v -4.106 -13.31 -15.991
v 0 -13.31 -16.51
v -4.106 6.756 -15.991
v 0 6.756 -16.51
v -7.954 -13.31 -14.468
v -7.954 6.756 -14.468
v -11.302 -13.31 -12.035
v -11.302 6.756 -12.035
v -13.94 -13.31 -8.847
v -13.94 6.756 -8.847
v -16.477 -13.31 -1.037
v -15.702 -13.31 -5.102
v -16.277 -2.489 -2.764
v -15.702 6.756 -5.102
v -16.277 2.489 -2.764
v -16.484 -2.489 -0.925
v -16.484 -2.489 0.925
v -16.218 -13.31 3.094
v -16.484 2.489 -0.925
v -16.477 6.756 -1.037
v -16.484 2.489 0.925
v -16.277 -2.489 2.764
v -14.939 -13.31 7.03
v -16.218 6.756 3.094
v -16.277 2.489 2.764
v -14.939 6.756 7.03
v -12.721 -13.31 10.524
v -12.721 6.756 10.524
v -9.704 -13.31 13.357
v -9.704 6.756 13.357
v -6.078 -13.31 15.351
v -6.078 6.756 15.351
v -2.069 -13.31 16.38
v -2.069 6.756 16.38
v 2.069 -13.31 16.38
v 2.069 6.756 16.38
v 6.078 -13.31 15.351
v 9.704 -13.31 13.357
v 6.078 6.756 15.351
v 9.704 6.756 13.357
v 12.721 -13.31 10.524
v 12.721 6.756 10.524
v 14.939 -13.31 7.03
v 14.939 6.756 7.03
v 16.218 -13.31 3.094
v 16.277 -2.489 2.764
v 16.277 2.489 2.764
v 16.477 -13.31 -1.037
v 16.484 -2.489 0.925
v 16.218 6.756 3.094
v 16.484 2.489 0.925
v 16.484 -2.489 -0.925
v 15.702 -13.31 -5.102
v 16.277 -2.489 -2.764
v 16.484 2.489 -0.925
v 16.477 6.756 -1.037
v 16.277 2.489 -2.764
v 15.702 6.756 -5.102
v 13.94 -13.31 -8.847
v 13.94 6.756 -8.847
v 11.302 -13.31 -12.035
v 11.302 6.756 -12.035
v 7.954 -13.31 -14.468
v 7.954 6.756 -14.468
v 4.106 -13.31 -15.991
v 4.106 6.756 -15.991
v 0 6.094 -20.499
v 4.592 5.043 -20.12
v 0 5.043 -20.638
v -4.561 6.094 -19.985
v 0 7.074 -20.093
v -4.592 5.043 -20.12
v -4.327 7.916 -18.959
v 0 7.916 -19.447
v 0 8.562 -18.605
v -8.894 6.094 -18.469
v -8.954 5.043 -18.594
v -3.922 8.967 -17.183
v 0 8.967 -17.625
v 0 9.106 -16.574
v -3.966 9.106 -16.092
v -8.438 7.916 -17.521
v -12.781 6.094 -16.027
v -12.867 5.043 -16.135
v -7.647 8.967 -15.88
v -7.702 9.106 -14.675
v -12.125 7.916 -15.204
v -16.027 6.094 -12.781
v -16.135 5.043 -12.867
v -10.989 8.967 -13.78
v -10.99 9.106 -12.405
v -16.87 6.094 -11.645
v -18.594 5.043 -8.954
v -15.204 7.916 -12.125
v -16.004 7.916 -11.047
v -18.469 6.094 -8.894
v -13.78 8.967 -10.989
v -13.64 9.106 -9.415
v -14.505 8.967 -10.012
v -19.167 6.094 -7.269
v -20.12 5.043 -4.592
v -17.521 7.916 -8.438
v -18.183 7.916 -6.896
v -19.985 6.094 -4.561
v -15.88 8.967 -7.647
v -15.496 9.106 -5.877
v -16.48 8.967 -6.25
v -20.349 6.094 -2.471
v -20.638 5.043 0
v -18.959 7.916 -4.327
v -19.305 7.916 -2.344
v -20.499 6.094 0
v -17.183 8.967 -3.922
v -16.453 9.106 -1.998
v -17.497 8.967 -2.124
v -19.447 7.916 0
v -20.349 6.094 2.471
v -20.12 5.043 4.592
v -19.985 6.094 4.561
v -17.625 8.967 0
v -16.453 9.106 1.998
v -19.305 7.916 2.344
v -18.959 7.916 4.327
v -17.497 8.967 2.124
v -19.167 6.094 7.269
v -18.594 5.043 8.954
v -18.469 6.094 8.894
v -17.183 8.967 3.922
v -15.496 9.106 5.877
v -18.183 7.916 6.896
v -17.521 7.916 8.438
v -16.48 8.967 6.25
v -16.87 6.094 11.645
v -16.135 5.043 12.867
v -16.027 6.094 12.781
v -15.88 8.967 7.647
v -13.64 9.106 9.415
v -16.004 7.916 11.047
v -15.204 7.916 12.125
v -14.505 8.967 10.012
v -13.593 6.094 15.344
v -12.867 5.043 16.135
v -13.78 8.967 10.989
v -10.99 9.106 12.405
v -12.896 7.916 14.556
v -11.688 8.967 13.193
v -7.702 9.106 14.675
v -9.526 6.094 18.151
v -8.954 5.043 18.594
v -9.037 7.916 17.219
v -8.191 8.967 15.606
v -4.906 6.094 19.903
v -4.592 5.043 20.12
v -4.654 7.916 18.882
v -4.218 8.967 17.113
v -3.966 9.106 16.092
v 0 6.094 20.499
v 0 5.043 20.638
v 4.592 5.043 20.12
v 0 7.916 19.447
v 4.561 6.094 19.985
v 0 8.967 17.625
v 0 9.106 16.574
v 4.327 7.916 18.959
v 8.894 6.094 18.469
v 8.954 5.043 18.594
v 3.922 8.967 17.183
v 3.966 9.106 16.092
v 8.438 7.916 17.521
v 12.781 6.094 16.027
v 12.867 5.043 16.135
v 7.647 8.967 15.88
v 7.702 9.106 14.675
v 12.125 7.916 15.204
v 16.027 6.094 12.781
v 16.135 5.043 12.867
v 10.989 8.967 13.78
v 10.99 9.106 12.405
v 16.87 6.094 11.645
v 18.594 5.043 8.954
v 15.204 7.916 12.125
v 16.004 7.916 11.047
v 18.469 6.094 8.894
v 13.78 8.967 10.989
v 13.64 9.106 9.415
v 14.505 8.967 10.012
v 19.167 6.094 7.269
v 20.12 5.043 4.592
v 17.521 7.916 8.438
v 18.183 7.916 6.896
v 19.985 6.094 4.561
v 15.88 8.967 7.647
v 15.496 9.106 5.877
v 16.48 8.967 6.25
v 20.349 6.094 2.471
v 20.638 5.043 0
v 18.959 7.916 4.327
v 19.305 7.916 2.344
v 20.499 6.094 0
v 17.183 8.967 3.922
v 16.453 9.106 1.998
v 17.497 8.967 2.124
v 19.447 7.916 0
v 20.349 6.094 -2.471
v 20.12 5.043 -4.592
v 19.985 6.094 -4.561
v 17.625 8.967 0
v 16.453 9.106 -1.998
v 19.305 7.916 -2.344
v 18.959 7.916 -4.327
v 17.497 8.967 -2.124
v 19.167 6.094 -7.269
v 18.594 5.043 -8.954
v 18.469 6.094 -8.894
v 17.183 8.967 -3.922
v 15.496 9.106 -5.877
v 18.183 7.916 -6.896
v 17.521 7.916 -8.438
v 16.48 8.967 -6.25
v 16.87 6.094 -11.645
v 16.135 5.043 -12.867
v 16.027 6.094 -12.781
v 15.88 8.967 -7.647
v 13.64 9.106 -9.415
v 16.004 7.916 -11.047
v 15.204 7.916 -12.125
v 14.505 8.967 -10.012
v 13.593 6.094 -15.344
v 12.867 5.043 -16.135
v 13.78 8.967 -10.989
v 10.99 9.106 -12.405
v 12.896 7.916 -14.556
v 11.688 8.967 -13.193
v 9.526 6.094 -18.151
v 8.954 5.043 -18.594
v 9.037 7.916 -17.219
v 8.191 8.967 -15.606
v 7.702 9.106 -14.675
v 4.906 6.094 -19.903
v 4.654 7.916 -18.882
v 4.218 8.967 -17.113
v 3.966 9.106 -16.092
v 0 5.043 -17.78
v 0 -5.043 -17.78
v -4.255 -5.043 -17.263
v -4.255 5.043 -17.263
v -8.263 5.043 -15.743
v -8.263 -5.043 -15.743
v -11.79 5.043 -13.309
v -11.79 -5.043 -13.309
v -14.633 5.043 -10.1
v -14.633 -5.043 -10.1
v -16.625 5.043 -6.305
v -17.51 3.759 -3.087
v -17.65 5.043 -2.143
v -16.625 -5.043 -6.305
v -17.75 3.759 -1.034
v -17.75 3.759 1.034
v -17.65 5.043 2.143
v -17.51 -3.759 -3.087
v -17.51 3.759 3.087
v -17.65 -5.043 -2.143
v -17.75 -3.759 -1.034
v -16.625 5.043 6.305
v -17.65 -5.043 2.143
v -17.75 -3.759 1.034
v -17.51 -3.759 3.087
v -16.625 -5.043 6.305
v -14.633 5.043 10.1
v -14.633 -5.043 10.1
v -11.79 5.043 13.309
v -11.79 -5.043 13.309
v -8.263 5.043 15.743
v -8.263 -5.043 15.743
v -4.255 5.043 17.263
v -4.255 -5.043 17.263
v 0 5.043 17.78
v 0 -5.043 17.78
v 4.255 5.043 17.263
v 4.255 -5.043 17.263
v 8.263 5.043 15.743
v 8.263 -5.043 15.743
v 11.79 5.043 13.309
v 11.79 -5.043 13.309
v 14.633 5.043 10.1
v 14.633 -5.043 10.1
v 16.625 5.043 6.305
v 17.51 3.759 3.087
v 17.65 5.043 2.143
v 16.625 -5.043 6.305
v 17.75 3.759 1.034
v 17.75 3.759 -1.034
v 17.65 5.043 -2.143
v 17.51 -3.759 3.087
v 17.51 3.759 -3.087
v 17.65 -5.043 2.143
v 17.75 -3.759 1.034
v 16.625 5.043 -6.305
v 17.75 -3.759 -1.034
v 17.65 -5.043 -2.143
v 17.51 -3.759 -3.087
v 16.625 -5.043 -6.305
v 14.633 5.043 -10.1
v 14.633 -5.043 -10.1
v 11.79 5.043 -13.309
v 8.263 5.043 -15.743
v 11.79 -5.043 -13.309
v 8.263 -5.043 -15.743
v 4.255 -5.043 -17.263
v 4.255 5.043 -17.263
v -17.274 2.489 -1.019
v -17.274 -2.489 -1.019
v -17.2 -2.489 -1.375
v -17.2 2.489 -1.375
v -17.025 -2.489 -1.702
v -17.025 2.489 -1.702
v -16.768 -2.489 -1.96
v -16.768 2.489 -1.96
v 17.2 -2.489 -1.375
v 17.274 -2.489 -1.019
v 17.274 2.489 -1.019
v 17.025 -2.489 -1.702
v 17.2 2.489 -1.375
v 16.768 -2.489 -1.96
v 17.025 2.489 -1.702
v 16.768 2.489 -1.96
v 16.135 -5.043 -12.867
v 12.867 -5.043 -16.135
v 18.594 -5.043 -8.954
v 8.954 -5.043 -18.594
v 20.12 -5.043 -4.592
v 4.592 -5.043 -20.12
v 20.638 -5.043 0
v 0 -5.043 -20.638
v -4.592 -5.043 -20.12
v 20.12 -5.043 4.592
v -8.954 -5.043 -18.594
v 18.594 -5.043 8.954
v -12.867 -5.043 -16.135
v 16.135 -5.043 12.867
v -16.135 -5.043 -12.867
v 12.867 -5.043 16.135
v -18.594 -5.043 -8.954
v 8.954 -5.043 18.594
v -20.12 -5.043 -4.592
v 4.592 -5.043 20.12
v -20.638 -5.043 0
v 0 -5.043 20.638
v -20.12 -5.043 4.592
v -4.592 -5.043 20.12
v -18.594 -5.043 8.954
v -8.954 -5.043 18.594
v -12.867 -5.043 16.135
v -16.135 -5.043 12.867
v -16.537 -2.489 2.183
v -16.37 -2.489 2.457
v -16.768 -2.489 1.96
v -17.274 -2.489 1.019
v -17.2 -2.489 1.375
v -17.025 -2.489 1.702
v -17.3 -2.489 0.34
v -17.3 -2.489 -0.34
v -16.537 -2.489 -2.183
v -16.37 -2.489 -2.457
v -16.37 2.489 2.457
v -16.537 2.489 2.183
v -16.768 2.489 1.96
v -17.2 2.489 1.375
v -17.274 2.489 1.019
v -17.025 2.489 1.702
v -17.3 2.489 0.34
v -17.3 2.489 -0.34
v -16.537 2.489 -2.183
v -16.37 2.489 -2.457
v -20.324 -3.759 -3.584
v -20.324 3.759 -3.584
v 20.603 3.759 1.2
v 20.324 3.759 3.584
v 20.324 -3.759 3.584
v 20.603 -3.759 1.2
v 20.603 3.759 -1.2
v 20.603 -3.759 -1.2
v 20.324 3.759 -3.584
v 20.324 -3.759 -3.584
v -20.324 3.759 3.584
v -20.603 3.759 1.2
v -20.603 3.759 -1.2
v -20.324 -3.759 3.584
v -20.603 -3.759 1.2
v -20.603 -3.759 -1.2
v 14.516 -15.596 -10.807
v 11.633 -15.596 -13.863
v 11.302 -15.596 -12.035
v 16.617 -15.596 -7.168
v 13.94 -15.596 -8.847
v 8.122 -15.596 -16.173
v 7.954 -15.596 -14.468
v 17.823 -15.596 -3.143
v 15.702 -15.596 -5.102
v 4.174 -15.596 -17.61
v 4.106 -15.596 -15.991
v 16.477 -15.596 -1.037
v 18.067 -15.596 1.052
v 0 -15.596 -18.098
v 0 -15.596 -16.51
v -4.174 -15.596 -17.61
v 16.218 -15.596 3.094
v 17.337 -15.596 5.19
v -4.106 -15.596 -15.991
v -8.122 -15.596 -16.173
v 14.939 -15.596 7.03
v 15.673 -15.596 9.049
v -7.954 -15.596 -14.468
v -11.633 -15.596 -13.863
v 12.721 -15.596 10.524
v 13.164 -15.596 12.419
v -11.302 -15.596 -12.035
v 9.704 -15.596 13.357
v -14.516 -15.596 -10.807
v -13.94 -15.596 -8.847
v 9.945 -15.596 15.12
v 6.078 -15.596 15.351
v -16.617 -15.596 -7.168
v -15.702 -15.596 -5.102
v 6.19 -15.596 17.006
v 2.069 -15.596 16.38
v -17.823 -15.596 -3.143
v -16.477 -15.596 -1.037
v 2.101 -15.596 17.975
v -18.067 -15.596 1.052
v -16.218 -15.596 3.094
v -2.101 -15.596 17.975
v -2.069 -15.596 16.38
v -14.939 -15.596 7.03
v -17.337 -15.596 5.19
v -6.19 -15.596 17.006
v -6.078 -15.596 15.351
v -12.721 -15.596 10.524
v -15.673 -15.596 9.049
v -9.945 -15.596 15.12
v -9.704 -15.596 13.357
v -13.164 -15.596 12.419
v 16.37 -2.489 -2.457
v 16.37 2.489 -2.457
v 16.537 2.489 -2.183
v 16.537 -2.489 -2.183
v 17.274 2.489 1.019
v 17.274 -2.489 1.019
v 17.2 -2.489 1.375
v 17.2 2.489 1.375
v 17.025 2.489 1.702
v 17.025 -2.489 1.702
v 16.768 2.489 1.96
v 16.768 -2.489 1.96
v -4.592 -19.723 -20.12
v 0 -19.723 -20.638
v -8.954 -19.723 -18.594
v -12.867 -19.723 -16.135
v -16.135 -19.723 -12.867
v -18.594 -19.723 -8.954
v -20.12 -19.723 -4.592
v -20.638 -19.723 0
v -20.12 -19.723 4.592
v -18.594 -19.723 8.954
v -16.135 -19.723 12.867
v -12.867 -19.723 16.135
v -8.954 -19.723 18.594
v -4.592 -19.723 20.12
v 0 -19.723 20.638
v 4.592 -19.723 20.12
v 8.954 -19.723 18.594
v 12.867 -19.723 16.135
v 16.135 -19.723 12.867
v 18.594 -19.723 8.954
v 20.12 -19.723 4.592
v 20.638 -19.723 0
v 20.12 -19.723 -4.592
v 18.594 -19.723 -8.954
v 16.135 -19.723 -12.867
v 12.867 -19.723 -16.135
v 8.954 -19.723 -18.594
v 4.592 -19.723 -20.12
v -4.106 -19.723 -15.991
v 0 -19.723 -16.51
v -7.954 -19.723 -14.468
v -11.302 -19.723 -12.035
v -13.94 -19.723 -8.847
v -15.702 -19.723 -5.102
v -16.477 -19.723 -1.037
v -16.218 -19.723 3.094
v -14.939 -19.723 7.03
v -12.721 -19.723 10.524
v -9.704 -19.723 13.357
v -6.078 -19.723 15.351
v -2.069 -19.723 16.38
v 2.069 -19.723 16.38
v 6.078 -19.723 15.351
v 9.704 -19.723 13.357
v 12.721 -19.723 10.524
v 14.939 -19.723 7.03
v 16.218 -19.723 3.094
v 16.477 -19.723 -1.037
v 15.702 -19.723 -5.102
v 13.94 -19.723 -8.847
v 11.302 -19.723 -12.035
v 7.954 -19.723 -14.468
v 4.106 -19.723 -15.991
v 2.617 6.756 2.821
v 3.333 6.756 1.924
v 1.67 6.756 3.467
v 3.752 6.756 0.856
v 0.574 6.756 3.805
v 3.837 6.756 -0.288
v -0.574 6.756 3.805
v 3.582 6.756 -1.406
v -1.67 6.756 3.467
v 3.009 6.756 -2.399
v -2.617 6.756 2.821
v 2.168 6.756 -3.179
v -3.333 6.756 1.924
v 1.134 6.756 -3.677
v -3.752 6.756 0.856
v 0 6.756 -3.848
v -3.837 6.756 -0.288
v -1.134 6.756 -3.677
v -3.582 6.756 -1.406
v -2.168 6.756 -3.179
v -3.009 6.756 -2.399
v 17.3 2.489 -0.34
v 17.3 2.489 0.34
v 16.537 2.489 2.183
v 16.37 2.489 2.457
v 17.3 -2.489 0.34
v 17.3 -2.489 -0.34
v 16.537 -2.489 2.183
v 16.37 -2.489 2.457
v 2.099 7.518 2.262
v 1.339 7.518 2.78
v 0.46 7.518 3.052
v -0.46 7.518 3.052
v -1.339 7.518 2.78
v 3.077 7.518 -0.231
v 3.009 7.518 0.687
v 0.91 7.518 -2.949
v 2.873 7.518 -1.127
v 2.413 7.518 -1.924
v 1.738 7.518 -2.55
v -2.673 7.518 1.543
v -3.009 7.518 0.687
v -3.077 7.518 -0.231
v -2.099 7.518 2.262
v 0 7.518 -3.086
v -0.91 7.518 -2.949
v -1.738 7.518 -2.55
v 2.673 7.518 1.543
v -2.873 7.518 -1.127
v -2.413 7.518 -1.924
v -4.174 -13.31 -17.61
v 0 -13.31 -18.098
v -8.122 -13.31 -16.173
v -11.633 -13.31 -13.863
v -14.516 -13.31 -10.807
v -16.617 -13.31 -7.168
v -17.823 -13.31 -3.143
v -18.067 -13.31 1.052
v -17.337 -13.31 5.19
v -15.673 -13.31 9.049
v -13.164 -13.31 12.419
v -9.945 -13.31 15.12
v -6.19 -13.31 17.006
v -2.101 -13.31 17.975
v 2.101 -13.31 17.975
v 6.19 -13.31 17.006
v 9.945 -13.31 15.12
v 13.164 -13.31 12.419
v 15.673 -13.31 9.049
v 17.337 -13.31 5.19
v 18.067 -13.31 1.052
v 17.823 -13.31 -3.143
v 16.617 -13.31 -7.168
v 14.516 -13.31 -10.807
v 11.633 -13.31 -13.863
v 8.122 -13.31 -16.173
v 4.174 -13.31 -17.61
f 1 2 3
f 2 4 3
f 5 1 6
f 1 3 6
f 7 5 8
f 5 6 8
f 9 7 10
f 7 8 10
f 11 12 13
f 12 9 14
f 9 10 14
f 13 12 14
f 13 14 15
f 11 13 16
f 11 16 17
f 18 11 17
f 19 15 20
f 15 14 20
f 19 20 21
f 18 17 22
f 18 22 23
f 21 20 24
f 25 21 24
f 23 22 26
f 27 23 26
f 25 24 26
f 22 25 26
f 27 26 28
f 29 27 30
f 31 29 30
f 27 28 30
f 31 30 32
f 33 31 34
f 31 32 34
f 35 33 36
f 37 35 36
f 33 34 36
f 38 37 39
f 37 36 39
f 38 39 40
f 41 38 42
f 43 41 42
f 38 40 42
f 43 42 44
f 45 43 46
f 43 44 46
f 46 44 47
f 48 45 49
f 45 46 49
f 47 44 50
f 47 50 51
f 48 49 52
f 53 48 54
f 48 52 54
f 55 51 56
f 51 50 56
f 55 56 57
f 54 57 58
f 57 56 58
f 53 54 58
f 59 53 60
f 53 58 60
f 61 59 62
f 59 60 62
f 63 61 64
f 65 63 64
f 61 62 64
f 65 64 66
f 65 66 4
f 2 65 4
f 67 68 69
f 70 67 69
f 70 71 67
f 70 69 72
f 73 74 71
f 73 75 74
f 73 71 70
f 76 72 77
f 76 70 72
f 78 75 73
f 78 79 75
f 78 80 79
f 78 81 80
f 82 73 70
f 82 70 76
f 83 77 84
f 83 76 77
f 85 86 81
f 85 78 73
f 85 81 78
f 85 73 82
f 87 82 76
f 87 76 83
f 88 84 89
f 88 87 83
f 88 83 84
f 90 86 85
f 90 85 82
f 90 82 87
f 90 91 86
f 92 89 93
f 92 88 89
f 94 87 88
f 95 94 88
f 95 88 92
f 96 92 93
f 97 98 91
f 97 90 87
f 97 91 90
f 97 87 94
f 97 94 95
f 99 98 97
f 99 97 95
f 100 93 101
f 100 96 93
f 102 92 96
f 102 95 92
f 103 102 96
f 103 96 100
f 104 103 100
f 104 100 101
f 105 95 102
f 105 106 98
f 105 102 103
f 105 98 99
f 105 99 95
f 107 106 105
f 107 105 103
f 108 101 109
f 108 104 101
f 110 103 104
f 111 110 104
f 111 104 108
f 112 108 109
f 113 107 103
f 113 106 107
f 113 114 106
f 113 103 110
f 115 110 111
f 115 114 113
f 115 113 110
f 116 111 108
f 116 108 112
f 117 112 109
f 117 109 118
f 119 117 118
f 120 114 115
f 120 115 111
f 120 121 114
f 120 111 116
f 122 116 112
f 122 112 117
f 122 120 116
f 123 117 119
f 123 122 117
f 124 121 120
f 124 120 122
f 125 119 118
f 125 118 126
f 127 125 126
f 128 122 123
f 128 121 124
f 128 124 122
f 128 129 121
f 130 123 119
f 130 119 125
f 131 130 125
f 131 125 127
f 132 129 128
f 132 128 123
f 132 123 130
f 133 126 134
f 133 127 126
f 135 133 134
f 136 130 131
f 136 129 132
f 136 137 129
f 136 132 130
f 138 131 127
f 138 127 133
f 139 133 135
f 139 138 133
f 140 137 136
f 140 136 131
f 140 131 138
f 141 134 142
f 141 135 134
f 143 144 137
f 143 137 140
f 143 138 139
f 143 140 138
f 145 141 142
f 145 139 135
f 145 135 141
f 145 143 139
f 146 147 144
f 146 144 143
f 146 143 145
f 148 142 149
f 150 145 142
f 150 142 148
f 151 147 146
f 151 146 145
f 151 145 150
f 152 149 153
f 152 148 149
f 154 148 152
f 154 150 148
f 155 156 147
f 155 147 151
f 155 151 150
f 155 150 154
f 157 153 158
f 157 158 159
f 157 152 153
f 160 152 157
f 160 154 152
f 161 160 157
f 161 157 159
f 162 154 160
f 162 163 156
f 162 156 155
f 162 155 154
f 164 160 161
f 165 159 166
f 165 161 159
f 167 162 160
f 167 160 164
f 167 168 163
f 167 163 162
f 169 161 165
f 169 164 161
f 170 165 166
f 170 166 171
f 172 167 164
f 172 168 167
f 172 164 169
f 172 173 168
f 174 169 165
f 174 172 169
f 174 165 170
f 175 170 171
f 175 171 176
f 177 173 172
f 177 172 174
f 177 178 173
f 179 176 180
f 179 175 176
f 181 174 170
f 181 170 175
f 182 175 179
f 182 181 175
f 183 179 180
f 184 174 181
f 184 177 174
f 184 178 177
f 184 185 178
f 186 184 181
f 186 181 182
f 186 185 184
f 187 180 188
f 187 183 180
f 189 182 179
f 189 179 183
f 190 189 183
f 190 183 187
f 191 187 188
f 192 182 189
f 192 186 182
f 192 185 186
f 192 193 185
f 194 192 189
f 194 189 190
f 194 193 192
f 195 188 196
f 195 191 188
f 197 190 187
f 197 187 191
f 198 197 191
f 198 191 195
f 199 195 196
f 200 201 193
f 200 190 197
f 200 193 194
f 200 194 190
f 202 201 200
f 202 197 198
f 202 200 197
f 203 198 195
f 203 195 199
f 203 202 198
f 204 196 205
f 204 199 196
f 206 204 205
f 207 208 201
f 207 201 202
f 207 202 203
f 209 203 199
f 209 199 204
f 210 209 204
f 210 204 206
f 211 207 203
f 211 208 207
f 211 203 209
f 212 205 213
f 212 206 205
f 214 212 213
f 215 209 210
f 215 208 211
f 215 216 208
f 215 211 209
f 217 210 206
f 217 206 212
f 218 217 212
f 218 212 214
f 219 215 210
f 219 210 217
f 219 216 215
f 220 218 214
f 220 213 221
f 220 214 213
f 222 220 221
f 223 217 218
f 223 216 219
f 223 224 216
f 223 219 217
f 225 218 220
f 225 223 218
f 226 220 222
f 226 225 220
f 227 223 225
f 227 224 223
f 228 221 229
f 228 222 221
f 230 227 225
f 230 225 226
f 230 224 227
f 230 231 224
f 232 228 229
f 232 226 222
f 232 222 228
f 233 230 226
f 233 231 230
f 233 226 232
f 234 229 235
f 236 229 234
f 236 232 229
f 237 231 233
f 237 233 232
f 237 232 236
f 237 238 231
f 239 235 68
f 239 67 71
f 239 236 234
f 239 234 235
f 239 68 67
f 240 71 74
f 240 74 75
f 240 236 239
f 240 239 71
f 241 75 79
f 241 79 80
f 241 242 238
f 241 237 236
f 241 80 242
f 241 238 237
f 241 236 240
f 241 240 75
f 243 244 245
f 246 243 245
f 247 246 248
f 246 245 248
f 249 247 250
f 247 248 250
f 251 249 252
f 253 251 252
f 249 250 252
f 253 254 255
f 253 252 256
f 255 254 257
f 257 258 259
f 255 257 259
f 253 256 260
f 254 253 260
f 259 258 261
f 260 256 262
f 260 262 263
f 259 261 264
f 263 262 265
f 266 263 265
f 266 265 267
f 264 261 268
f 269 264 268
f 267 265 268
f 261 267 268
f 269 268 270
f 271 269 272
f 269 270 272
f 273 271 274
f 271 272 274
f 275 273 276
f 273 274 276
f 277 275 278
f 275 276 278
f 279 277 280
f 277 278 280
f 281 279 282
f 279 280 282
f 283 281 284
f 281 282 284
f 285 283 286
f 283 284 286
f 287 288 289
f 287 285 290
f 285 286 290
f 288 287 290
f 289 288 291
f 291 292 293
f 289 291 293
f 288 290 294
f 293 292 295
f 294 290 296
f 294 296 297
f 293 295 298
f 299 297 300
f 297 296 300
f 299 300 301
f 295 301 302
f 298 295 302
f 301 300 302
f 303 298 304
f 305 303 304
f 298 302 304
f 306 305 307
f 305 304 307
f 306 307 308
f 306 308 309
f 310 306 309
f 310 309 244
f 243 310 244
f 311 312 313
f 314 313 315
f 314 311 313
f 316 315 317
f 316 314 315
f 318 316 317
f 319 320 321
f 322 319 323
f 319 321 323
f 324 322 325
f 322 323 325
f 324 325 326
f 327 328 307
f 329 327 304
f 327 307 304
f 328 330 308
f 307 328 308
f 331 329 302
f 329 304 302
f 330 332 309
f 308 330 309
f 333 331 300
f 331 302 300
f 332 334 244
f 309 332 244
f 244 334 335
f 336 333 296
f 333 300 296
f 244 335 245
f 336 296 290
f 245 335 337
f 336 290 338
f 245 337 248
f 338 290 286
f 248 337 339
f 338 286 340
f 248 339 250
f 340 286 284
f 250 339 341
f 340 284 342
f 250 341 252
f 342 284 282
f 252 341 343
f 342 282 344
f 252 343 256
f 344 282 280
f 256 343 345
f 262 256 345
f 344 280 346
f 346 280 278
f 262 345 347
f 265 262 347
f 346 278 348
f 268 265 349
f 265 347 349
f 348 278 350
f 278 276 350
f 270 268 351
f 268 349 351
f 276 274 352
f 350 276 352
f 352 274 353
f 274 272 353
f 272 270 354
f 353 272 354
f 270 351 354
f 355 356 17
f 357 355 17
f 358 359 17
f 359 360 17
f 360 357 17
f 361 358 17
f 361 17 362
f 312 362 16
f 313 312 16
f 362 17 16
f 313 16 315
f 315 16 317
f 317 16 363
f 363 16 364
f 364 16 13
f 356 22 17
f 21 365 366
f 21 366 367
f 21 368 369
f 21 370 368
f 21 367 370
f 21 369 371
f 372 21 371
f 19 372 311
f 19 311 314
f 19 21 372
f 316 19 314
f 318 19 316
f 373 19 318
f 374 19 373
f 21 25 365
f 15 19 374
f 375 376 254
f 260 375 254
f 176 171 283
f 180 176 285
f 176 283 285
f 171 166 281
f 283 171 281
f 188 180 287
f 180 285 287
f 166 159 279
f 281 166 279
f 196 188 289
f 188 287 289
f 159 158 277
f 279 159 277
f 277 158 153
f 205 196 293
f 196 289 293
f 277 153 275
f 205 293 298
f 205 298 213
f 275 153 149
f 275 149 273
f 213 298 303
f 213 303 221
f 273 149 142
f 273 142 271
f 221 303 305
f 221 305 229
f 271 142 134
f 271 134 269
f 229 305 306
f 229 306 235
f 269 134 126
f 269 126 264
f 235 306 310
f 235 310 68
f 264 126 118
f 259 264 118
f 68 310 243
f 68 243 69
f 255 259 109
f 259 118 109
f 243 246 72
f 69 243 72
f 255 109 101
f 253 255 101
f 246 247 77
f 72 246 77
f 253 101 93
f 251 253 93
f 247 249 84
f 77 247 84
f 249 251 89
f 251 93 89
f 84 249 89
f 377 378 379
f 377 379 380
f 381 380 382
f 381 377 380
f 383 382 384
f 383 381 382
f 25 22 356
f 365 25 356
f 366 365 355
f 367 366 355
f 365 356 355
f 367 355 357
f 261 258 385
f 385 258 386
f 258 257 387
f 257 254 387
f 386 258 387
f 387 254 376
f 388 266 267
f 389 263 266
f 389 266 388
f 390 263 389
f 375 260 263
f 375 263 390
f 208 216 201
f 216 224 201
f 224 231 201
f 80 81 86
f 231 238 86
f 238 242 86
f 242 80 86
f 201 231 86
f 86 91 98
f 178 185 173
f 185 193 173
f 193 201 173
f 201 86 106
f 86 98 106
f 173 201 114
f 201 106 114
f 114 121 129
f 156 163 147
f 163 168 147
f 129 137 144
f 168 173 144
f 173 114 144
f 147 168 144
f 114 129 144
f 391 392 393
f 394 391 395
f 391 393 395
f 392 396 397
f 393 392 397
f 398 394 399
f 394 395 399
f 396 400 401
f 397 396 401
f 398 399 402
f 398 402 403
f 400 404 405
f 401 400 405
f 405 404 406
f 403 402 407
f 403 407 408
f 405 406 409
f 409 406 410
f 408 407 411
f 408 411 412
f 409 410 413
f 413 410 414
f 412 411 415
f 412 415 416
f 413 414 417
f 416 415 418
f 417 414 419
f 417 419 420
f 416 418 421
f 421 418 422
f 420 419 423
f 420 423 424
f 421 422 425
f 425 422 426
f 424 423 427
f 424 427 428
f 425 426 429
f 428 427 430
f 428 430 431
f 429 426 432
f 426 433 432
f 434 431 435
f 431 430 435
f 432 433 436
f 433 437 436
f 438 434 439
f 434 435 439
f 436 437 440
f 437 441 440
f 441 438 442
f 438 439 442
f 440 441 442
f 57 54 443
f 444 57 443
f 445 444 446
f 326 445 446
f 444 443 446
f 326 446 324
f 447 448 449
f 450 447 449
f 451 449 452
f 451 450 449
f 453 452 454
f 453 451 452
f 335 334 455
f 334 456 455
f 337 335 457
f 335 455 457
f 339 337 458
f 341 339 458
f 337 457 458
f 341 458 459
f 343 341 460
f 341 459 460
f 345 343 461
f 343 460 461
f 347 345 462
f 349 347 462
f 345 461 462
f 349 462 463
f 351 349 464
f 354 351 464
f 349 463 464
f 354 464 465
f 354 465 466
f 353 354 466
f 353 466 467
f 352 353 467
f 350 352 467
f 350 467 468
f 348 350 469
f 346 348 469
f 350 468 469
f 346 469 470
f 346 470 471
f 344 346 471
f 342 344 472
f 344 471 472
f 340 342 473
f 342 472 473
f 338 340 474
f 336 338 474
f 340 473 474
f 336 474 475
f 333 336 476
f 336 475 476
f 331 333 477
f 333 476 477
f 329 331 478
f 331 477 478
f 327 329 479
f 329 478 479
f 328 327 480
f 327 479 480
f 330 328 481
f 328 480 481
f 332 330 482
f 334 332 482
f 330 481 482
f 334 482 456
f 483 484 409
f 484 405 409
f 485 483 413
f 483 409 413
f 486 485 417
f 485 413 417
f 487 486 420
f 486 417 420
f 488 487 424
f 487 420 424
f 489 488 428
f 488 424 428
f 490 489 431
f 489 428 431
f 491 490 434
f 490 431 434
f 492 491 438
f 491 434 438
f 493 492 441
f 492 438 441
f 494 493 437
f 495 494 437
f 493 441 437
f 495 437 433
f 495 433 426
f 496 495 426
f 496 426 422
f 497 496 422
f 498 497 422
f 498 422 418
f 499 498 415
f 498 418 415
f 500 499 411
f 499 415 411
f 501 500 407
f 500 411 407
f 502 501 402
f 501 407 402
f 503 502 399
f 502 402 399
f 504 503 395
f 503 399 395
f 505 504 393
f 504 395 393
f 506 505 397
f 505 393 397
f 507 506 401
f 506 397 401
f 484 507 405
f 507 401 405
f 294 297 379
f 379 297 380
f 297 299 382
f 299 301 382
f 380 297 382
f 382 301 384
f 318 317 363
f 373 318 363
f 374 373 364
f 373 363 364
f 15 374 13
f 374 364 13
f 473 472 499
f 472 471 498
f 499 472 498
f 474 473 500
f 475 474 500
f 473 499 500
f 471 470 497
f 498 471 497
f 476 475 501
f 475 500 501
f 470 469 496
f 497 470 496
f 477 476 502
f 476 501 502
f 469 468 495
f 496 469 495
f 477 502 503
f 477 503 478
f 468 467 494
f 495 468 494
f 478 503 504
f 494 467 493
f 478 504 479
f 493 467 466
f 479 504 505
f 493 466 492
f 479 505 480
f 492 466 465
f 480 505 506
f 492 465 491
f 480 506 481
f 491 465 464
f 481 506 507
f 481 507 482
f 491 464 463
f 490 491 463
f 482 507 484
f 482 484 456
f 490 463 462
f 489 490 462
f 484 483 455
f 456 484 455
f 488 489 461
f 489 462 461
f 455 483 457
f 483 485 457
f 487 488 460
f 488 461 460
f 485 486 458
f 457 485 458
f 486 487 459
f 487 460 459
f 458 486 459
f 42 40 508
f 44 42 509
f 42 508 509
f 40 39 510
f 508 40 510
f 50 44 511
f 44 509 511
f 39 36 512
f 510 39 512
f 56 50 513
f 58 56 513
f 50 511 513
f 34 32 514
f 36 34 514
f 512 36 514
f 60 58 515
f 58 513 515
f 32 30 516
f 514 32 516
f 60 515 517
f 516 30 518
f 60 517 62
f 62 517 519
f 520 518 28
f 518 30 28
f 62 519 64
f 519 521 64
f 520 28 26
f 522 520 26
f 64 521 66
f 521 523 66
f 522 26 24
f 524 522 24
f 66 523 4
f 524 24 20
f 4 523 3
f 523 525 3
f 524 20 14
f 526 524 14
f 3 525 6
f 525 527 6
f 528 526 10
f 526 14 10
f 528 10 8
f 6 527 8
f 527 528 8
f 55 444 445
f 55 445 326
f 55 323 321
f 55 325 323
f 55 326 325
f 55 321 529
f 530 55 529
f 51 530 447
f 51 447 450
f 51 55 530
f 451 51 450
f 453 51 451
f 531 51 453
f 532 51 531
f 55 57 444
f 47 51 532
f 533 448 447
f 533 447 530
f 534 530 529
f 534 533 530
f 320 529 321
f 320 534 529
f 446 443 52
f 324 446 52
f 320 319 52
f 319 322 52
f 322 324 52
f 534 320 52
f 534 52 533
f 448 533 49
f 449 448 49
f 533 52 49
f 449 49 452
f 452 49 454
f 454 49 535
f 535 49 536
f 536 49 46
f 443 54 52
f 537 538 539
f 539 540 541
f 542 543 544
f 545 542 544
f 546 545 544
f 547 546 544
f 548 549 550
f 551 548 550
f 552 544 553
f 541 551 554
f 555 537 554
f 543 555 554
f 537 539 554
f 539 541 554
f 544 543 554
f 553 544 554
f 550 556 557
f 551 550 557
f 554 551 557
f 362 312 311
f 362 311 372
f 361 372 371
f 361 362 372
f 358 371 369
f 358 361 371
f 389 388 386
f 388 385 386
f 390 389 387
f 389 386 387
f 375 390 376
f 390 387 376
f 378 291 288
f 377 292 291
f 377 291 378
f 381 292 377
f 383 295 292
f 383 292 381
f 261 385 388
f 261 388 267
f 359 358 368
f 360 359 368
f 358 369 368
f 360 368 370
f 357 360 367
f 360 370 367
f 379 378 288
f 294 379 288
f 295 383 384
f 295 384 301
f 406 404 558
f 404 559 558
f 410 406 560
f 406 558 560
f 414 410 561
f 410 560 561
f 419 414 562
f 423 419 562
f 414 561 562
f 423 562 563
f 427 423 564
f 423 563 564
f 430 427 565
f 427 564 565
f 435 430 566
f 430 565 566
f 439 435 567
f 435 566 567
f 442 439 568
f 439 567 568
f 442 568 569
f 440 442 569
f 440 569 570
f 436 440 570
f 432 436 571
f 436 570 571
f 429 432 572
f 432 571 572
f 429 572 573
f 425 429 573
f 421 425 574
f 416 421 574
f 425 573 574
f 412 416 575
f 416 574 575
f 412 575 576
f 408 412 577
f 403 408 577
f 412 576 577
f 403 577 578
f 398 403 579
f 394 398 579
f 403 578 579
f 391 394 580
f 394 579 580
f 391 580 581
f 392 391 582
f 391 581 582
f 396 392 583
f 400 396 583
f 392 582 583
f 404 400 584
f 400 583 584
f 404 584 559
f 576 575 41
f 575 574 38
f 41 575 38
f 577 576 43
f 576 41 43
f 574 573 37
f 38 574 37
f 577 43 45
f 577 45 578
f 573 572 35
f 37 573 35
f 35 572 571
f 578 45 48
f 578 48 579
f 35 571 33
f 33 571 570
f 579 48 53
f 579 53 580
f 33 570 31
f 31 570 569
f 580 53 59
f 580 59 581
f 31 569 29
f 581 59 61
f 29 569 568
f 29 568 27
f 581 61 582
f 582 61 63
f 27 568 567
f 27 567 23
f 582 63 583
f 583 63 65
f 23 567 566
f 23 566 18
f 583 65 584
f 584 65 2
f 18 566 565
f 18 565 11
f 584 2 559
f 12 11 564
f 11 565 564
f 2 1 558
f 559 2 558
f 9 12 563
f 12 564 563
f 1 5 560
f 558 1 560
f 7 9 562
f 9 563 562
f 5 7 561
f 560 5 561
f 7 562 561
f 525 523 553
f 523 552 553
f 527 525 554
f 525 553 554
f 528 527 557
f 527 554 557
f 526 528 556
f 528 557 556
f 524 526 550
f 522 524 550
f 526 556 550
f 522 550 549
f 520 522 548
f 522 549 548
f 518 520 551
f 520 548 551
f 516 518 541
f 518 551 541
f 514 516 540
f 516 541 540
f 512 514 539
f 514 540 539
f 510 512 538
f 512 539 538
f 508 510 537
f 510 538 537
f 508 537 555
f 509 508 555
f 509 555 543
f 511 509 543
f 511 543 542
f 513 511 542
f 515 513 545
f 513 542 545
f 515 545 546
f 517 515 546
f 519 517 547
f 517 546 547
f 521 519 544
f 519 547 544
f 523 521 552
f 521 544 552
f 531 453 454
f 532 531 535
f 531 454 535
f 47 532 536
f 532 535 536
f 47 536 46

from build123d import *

# Parameters (mm, degrees)
FILLET1_R          = 4.064
SKETCH10_W         = 2.857500069
SKETCH10_H         = 7.5184
REVOLVE3_ANGLE     = 20
CUT_EXTRUDE1_START = 1.27
CUT_EXTRUDE1_DEPTH = 4.9784
CIRPATTERN4_COUNT  = 2
FILLET8_R          = 1.27
FILLET9_R          = 1.27


with BuildPart() as part:
    # Sketch1 → Revolve1 (revolve)
    with BuildSketch(Plane.XY, mode=Mode.PRIVATE) as revolve1_sk:
        Polygon((0, 9.1059), (-20.6375, 9.1059), (-20.6375, 5.042647059), (-17.78, 5.042647059), (-17.78, -5.042647059), (-20.6375, -5.042647059), (-20.6375, -19.7231), (-16.51, -19.7231), (-16.51, -15.5956), (-18.0975, -15.5956), (-18.0975, -13.3096), (-16.51, -13.3096), (-16.51, 6.7564), (-3.8481, 6.7564), (-3.0861, 7.5184), (0, 7.5184), align=None)
    revolve(revolve1_sk.sketch.rotate(Axis((0, 0, 0), (0, 1, 0)), 270), axis=Axis((0, 0, 0), (0, 1, 0)))

    # Fillet1
    # the kernel refuses this fillet: 4.064 mm, written as the material it takes off along each edge
    with BuildSketch(Plane(origin=(0, 9.1059, 0), x_dir=(0, 0, -1), z_dir=(1, 0, 0))) as fillet1_piece_1:
        with BuildLine():
            CenterArc((16.573500069, -4.064), FILLET1_R, 0.010532312, 89.989467688)
            Line((20.6375, -4.063252941), (20.718779999, -4.063238))
            Line((20.718779999, -4.063238), (20.71878, 0))
            Line((20.71878, 0), (20.6375, 0.08128))
            Line((20.6375, 0.08128), (16.573500069, 0.08128))
            Line((16.573500069, 0.08128), (16.573500069, 0))
        make_face()
    revolve(axis=Axis((0, 9.1059, 0), (0, 1, 0)), mode=Mode.SUBTRACT)

    # Sketch10 → Revolve3 (revolve, symmetric)
    with BuildSketch(Plane.XY) as revolve3_sk:
        with Locations((-19.208750034, 0)):
            Rectangle(SKETCH10_W, SKETCH10_H)
    revolve3 = revolve(axis=Axis((0, 0, 0), (0, 1, 0)), revolution_arc=REVOLVE3_ANGLE / 2)
    revolve3 = revolve3 + revolve(revolve3_sk.sketch, axis=Axis((0, 0, 0), (0, -1, 0)), revolution_arc=REVOLVE3_ANGLE / 2)

    # Sketch12 → Cut-Extrude1 (cut)
    with BuildSketch(Plane(origin=(0, -3.7592, 0), x_dir=(1, 0, 0), z_dir=(0, 1, 0)).offset(CUT_EXTRUDE1_START)):
        with BuildLine():
            Line((-7.313638514, 0), (-17.215440903, 1.745954919))
            ThreePointArc((-17.215440903, 1.745954919), (-17.30375, 0), (-17.215440903, -1.745954919))
            Line((-17.215440903, -1.745954919), (-7.313638514, 0))
        make_face()
    cut_extrude1 = extrude(amount=CUT_EXTRUDE1_DEPTH, mode=Mode.SUBTRACT)

    # CirPattern4: Revolve3, Cut-Extrude1 ×2 about axis
    cirpattern4_axis = Axis((0, 0, 0), (0, 1, 0))
    add([revolve3.rotate(cirpattern4_axis, i * 360 / CIRPATTERN4_COUNT) for i in range(1, CIRPATTERN4_COUNT)])
    add([cut_extrude1.rotate(cirpattern4_axis, i * 360 / CIRPATTERN4_COUNT) for i in range(1, CIRPATTERN4_COUNT)], mode=Mode.SUBTRACT)

    # Fillet8
    # the kernel refuses this fillet: 1.27 mm, written as the material it takes off along each edge
    with BuildSketch(Plane(origin=(-16.431533746, -2.4892, -1.607730937), x_dir=(0.1324793231915166, 0, -0.9911857691304479), z_dir=(0, 1, 0)), Plane(origin=(16.431533746, -2.4892, 1.607730937), x_dir=(-0.13247932319151873, 0, 0.9911857691304475), z_dir=(0, 1, 0))) as fillet8_piece_1:
        with BuildLine():
            CenterArc((1.211424462, 1.269207194), FILLET8_R, 201.909884157, 66.065503548)
            Line((0.033154154, 0.795309438), (0.009588748, 0.785831483))
            ThreePointArc((0.009588748, 0.785831483), (-0.008800881, 0.398712653), (-0.025377958, 0.001057934))
            Line((-0.025377958, 0.001057934), (0.000897351, -0.025384144))
            ThreePointArc((0.000897351, -0.025384144), (0.583278445, -0.01509352), (1.165659538, -0.025384144))
            Line((1.165659538, -0.025384144), (1.166556889, 0))
        make_face()
    extrude(amount=4.9784, mode=Mode.SUBTRACT)
    with BuildSketch(Plane(origin=(-16.431533746, -2.4892, 1.607730937), x_dir=(0.13247932319152245, 0, 0.9911857691304472), z_dir=(0, 1, 0)), Plane(origin=(16.431533746, -2.4892, -1.607730937), x_dir=(-0.13247932319151992, 0, -0.9911857691304475), z_dir=(0, 1, 0))) as fillet8_piece_2:
        with BuildLine():
            CenterArc((1.211424462, -1.269207194), FILLET8_R, 92.024612295, 66.065503548)
            Line((0.033154154, -0.795309438), (0.009588748, -0.785831483))
            ThreePointArc((0.009588748, -0.785831483), (-0.008800881, -0.398712653), (-0.025377958, -0.001057934))
            Line((-0.025377958, -0.001057934), (0.000897351, 0.025384144))
            ThreePointArc((0.000897351, 0.025384144), (0.583278445, 0.01509352), (1.165659538, 0.025384144))
            Line((1.165659538, 0.025384144), (1.166556889, 0))
        make_face()
    extrude(amount=4.9784, mode=Mode.SUBTRACT)

    # Fillet9
    fillet9_edges = [part.edges().sort_by_distance(p)[0] for p in [
        (-17.215440903, 0, 1.745954919),
        (-17.215440903, 0, -1.745954919),
        (17.215440903, 0, -1.745954919),
        (17.215440903, 0, 1.745954919),
    ]]
    fillet(fillet9_edges, radius=FILLET9_R)


solid = part.part
